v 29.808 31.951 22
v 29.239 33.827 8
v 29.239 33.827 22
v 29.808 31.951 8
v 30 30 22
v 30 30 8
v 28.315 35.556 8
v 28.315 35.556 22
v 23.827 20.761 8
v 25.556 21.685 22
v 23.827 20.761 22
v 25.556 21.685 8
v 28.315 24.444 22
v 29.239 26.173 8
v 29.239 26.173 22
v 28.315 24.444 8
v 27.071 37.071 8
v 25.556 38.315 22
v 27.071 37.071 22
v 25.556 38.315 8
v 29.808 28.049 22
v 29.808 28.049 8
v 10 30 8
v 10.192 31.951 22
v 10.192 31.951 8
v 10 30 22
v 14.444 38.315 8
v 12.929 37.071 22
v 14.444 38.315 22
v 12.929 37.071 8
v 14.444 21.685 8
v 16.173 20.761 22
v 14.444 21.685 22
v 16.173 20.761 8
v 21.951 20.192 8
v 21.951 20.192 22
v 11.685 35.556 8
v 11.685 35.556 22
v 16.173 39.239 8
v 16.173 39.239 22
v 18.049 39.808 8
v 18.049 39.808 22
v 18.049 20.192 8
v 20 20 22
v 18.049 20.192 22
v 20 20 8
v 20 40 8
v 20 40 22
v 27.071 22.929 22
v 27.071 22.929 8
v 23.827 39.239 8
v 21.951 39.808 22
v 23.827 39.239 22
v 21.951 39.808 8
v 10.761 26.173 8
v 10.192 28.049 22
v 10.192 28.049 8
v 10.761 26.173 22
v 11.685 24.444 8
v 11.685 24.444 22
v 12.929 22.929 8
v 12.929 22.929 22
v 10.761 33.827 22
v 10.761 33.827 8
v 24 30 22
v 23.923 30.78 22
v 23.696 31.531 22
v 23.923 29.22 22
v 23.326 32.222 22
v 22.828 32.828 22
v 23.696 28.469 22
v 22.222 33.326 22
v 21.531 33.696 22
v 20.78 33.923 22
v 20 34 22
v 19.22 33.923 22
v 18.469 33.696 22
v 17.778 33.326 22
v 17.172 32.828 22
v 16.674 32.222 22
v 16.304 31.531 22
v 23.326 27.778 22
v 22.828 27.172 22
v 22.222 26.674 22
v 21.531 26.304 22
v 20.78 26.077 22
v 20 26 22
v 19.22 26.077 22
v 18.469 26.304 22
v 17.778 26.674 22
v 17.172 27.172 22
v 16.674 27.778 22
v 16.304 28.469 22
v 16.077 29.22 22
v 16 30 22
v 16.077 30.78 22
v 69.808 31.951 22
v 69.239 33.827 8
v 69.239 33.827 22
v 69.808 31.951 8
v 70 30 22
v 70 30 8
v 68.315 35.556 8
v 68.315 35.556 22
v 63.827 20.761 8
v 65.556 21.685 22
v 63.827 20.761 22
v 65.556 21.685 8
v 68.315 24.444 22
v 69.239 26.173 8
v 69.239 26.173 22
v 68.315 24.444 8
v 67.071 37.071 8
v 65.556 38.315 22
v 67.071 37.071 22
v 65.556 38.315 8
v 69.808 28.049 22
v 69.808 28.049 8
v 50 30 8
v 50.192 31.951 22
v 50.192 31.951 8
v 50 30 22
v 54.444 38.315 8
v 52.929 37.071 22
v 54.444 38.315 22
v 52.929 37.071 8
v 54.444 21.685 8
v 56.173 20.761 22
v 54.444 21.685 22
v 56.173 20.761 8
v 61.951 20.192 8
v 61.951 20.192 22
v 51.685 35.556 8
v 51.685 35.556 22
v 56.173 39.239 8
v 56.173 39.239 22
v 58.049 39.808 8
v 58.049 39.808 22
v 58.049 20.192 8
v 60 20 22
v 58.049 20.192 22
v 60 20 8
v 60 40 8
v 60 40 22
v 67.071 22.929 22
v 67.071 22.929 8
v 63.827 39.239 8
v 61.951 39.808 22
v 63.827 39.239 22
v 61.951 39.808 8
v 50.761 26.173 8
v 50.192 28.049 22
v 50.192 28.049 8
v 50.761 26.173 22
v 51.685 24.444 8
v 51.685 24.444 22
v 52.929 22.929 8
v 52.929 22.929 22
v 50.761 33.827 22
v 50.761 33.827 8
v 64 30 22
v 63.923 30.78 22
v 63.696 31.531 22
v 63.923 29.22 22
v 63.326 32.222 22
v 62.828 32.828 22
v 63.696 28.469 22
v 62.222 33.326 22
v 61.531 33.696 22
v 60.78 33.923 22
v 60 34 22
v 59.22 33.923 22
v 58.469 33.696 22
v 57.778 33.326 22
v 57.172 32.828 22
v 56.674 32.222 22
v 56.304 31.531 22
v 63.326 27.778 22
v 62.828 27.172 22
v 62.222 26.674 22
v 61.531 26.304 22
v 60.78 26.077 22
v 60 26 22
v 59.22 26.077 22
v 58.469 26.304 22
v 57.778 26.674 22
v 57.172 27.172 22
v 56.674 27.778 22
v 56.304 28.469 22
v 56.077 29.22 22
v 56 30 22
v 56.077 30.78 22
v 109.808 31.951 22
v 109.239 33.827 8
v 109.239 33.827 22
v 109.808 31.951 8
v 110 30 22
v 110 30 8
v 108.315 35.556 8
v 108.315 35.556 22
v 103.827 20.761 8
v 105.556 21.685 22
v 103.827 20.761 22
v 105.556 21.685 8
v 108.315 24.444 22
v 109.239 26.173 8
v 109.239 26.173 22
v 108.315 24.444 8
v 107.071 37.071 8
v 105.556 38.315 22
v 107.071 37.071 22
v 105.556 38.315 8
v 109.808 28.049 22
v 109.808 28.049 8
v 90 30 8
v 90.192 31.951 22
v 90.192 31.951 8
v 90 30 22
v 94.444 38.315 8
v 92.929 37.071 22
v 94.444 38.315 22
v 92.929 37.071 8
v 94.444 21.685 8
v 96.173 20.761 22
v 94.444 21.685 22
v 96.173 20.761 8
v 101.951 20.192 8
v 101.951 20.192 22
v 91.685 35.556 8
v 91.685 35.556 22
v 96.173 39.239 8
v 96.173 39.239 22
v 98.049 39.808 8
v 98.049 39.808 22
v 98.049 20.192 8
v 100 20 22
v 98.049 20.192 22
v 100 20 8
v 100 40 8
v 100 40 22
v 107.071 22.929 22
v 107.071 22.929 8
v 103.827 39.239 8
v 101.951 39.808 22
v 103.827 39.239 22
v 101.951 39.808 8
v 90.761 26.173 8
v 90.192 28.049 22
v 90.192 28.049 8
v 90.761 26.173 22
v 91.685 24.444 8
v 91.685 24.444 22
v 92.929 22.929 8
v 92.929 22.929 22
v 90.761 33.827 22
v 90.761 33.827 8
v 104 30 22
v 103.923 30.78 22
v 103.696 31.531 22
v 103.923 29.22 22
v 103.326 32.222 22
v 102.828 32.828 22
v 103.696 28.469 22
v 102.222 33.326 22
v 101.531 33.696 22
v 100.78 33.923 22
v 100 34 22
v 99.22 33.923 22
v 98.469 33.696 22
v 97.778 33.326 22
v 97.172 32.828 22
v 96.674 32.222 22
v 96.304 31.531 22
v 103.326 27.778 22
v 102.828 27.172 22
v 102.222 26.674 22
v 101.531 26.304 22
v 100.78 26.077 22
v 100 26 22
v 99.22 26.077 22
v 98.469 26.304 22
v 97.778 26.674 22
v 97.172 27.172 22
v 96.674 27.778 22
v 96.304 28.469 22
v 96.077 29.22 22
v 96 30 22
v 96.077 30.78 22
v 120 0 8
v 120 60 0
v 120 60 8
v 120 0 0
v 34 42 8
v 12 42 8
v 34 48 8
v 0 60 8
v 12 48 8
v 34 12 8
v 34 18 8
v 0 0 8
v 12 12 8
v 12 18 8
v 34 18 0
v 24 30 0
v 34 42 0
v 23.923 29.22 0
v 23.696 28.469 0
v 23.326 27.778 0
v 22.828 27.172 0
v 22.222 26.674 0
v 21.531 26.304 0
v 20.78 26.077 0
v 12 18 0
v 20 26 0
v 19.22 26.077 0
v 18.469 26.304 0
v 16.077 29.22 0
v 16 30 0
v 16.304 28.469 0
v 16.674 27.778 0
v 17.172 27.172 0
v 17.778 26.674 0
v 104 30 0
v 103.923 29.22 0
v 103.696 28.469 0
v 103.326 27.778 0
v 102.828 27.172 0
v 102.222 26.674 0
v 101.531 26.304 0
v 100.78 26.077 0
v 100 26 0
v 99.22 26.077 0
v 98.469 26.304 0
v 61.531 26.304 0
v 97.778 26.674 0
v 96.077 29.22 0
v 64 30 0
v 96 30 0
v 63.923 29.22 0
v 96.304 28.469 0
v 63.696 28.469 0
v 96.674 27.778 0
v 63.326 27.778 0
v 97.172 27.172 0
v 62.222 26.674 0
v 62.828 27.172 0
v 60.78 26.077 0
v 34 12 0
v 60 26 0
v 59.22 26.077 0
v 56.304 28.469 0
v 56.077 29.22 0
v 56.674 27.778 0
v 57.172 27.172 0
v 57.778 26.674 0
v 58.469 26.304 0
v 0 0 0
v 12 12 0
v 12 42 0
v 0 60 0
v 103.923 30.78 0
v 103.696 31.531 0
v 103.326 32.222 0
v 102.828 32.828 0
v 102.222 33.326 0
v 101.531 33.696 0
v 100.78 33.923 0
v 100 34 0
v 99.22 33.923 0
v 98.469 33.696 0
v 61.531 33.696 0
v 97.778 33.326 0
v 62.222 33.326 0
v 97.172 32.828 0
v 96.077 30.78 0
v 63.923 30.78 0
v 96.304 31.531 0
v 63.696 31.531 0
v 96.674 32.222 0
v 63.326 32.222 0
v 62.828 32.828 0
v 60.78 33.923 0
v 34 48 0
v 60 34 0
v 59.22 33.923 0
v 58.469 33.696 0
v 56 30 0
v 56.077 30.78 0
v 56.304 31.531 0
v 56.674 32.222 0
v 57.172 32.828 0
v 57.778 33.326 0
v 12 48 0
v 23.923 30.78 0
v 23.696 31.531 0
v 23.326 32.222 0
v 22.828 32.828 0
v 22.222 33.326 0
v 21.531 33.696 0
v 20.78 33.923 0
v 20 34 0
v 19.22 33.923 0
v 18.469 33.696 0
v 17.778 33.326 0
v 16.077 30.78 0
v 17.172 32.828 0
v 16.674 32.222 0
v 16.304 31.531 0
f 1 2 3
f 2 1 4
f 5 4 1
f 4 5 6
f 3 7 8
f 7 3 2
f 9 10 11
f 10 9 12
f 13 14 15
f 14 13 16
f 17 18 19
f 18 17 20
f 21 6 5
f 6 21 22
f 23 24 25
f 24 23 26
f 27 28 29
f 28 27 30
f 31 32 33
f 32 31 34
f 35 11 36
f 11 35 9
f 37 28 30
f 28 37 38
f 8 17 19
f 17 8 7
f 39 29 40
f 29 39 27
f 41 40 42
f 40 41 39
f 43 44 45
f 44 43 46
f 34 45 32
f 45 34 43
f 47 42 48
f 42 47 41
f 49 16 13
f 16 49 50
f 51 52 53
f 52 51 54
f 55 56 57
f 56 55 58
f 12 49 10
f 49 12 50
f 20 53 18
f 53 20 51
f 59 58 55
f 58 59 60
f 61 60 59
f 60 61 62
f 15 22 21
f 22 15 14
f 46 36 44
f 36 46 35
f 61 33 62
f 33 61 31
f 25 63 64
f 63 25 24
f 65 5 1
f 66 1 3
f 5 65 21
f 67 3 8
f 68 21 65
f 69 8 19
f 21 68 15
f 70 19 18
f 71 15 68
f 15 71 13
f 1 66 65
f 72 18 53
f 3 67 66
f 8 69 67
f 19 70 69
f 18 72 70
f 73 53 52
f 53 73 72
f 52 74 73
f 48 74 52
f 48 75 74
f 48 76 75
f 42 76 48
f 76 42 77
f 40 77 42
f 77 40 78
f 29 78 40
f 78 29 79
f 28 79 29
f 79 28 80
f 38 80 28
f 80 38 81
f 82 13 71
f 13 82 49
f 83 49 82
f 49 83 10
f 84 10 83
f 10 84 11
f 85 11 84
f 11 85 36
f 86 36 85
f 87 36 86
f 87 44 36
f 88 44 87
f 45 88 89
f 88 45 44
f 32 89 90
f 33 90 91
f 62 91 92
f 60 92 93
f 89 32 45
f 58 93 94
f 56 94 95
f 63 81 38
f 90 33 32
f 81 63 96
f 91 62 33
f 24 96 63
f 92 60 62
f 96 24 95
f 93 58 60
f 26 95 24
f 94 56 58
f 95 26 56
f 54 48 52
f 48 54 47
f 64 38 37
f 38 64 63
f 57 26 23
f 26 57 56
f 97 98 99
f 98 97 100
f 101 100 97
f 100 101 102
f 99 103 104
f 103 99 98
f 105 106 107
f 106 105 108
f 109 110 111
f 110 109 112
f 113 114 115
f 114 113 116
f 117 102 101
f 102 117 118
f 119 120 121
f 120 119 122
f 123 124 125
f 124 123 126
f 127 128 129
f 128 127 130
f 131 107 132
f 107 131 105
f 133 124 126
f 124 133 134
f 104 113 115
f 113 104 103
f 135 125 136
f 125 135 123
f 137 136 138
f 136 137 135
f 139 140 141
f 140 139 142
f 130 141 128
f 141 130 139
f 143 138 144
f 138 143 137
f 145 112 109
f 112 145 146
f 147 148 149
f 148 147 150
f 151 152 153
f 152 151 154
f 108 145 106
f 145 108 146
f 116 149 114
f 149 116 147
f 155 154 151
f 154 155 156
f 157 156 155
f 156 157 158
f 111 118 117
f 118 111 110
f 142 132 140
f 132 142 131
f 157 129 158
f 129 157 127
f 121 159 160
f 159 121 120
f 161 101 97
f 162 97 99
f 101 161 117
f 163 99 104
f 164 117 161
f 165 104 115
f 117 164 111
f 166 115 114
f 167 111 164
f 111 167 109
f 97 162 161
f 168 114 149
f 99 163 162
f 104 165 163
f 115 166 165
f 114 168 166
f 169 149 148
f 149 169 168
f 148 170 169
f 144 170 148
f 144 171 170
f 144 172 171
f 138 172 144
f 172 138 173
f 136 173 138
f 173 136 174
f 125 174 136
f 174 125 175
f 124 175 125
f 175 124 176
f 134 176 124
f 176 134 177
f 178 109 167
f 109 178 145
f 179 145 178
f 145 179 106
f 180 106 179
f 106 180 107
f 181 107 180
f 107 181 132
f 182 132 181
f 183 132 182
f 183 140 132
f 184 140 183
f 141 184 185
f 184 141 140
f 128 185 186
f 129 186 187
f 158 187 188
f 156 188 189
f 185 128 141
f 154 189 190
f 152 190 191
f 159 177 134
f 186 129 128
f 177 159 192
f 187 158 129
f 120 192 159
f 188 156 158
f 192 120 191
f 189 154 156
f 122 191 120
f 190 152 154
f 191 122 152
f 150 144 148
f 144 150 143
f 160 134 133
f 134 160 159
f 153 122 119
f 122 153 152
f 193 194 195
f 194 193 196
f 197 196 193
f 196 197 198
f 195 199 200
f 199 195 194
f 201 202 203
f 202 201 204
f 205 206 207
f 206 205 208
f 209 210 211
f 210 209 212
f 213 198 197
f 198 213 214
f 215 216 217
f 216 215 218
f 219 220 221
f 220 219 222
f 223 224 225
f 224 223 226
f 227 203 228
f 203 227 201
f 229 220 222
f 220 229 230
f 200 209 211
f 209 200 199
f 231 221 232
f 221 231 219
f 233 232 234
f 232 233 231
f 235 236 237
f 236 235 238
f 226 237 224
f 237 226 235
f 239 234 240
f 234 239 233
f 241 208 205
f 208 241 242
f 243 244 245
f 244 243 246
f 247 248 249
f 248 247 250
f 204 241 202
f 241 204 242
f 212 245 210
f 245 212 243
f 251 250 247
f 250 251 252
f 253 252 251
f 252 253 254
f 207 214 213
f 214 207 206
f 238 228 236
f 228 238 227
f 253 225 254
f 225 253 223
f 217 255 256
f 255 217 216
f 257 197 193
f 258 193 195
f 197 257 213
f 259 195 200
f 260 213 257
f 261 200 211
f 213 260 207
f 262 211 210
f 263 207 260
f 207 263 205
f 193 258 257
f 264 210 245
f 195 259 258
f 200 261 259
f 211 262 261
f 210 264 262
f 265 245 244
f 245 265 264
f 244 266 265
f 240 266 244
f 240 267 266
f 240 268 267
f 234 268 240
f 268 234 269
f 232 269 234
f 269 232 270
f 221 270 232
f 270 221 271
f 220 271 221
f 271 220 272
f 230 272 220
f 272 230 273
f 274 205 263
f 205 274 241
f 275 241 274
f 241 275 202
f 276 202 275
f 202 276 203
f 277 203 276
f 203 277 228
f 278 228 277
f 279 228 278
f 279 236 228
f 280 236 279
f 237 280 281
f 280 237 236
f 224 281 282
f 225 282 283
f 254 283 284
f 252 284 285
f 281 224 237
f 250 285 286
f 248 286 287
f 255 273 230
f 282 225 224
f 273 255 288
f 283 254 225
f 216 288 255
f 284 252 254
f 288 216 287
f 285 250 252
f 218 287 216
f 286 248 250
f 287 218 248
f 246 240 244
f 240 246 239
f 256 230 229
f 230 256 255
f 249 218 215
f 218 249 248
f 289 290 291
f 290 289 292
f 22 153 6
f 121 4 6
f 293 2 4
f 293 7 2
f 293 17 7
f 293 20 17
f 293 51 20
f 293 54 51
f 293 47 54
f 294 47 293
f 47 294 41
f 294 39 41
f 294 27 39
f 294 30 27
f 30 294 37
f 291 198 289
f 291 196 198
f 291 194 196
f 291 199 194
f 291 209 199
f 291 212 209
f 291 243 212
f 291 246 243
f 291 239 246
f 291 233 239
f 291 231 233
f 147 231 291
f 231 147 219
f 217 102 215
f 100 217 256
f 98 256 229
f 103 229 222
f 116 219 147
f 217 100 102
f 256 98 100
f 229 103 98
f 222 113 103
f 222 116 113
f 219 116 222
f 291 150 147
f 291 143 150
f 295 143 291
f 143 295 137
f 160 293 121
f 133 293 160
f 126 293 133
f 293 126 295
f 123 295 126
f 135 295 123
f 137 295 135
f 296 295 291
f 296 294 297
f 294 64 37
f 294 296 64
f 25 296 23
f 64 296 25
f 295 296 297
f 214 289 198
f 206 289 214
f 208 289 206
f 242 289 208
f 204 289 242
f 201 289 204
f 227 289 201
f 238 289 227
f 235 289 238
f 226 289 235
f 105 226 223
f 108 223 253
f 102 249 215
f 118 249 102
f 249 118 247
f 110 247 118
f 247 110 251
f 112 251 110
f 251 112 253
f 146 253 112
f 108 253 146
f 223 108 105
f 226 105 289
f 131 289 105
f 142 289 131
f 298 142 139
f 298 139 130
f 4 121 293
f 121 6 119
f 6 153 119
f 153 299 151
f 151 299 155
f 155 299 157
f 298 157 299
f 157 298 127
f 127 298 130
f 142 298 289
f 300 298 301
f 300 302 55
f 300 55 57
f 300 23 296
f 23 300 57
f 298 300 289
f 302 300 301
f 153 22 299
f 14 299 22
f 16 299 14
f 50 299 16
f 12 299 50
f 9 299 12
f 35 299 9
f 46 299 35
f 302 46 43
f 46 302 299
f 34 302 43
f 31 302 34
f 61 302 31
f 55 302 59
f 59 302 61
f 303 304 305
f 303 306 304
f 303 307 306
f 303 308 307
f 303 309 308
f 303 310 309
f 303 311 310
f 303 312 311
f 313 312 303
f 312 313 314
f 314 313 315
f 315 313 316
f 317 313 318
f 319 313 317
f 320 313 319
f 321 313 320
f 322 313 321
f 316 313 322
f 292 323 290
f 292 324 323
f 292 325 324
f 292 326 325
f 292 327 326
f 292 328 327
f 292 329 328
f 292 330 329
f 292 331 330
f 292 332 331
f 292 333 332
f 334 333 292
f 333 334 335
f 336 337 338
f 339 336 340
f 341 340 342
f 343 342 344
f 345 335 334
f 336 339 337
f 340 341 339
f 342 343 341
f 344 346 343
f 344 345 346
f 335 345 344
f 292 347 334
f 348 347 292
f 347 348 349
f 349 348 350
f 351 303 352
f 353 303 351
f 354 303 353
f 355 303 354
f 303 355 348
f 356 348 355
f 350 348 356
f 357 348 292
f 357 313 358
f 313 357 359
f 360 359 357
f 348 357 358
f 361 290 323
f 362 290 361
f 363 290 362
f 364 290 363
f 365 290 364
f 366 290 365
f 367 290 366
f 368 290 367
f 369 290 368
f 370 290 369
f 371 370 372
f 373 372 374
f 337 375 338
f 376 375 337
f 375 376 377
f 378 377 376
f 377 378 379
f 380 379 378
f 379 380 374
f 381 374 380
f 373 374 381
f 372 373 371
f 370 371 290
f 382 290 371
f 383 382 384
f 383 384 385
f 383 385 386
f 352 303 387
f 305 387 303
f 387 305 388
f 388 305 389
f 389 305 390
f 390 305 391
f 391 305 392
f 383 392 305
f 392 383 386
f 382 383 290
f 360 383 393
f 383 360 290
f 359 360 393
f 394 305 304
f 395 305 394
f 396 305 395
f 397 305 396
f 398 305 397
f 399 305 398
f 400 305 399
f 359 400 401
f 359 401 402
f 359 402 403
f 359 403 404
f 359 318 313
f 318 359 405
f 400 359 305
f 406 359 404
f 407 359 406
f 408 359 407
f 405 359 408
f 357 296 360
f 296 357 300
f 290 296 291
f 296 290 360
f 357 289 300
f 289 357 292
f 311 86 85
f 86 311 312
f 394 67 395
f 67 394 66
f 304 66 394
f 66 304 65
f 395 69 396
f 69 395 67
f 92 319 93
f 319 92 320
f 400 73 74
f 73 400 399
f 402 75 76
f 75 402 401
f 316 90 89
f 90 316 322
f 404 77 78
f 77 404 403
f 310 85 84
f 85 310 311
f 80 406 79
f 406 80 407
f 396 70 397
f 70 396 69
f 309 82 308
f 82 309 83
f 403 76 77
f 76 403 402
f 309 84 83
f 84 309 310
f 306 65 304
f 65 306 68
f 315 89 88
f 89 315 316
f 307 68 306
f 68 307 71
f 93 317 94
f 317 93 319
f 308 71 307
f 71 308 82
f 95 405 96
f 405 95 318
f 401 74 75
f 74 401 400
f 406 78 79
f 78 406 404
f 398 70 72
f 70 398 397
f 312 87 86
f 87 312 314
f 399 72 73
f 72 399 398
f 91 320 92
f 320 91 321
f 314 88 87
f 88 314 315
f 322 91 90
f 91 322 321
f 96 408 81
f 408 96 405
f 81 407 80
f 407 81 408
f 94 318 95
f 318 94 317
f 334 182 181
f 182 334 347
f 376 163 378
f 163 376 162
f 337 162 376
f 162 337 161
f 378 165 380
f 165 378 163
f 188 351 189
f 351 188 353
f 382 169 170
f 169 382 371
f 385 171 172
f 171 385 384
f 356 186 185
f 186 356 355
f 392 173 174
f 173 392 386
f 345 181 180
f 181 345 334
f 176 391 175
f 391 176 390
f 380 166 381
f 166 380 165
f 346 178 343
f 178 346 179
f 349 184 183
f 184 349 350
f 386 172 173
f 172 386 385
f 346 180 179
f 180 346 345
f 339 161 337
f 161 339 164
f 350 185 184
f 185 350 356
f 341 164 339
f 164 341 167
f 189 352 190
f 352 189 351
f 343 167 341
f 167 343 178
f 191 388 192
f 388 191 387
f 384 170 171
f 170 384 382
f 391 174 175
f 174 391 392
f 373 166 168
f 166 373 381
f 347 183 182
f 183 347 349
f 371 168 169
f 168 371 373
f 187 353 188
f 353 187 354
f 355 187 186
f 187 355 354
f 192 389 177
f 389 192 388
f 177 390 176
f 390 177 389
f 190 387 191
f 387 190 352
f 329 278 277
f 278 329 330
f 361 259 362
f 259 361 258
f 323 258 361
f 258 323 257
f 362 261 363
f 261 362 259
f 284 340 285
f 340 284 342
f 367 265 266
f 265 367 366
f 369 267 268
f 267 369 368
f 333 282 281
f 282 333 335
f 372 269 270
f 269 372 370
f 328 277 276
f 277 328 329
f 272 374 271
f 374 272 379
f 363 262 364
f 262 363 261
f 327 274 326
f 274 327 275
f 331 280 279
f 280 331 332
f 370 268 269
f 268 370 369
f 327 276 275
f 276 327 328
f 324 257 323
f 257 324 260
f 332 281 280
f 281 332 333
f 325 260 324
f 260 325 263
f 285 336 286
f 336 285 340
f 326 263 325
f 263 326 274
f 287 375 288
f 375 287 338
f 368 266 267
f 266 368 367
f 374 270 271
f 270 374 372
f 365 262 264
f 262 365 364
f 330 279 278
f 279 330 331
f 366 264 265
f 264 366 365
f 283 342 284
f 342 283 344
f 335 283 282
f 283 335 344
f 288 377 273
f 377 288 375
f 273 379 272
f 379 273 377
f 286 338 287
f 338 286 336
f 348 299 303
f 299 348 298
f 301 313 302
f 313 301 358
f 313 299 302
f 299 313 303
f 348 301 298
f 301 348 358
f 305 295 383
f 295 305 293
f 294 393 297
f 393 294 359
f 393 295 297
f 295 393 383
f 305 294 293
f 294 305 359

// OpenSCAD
$fn = 32;

// ----------------------------------------------------------------------
// Drill jig: three_boss_slot jig
// ----------------------------------------------------------------------

// --- parameters (mm) ---
plate_l = 120;            // plate length, X
plate_w = 60;             // plate width, Y
plate_t = 8;              // plate thickness
boss_d = 20;              // guide boss diameter
boss_h = 15;              // boss height above the plate
guide_d = 8;              // guide hole diameter
boss_pitch = 40;          // boss pitch
slot_w = 6;               // clamp slot width
slot_l = 22;              // clamp slot length
slot_x = 12;              // slot start X

n_boss = 3;  // guide bosses
boss_x0 = (plate_l - (n_boss - 1) * boss_pitch) / 2;  // first boss X
boss_top = plate_t - 1 + boss_h;  // boss crown height
total_h = boss_top;  // overall height

difference() {
  union() {
  cube([plate_l, plate_w, plate_t]);
  for (i = [0 : n_boss - 1])
    translate([boss_x0 + i * boss_pitch, plate_w / 2, plate_t - 1])
      cylinder(h = boss_h, d = boss_d);
  }
  for (i = [0 : n_boss - 1])
    translate([boss_x0 + i * boss_pitch, plate_w / 2, -1])
      cylinder(h = plate_t + boss_h, d = guide_d);
  for (cy = [plate_w * 0.25, plate_w * 0.75])
    translate([slot_x, cy - slot_w / 2, -1])
      cube([slot_l, slot_w, plate_t + 2]);
}
